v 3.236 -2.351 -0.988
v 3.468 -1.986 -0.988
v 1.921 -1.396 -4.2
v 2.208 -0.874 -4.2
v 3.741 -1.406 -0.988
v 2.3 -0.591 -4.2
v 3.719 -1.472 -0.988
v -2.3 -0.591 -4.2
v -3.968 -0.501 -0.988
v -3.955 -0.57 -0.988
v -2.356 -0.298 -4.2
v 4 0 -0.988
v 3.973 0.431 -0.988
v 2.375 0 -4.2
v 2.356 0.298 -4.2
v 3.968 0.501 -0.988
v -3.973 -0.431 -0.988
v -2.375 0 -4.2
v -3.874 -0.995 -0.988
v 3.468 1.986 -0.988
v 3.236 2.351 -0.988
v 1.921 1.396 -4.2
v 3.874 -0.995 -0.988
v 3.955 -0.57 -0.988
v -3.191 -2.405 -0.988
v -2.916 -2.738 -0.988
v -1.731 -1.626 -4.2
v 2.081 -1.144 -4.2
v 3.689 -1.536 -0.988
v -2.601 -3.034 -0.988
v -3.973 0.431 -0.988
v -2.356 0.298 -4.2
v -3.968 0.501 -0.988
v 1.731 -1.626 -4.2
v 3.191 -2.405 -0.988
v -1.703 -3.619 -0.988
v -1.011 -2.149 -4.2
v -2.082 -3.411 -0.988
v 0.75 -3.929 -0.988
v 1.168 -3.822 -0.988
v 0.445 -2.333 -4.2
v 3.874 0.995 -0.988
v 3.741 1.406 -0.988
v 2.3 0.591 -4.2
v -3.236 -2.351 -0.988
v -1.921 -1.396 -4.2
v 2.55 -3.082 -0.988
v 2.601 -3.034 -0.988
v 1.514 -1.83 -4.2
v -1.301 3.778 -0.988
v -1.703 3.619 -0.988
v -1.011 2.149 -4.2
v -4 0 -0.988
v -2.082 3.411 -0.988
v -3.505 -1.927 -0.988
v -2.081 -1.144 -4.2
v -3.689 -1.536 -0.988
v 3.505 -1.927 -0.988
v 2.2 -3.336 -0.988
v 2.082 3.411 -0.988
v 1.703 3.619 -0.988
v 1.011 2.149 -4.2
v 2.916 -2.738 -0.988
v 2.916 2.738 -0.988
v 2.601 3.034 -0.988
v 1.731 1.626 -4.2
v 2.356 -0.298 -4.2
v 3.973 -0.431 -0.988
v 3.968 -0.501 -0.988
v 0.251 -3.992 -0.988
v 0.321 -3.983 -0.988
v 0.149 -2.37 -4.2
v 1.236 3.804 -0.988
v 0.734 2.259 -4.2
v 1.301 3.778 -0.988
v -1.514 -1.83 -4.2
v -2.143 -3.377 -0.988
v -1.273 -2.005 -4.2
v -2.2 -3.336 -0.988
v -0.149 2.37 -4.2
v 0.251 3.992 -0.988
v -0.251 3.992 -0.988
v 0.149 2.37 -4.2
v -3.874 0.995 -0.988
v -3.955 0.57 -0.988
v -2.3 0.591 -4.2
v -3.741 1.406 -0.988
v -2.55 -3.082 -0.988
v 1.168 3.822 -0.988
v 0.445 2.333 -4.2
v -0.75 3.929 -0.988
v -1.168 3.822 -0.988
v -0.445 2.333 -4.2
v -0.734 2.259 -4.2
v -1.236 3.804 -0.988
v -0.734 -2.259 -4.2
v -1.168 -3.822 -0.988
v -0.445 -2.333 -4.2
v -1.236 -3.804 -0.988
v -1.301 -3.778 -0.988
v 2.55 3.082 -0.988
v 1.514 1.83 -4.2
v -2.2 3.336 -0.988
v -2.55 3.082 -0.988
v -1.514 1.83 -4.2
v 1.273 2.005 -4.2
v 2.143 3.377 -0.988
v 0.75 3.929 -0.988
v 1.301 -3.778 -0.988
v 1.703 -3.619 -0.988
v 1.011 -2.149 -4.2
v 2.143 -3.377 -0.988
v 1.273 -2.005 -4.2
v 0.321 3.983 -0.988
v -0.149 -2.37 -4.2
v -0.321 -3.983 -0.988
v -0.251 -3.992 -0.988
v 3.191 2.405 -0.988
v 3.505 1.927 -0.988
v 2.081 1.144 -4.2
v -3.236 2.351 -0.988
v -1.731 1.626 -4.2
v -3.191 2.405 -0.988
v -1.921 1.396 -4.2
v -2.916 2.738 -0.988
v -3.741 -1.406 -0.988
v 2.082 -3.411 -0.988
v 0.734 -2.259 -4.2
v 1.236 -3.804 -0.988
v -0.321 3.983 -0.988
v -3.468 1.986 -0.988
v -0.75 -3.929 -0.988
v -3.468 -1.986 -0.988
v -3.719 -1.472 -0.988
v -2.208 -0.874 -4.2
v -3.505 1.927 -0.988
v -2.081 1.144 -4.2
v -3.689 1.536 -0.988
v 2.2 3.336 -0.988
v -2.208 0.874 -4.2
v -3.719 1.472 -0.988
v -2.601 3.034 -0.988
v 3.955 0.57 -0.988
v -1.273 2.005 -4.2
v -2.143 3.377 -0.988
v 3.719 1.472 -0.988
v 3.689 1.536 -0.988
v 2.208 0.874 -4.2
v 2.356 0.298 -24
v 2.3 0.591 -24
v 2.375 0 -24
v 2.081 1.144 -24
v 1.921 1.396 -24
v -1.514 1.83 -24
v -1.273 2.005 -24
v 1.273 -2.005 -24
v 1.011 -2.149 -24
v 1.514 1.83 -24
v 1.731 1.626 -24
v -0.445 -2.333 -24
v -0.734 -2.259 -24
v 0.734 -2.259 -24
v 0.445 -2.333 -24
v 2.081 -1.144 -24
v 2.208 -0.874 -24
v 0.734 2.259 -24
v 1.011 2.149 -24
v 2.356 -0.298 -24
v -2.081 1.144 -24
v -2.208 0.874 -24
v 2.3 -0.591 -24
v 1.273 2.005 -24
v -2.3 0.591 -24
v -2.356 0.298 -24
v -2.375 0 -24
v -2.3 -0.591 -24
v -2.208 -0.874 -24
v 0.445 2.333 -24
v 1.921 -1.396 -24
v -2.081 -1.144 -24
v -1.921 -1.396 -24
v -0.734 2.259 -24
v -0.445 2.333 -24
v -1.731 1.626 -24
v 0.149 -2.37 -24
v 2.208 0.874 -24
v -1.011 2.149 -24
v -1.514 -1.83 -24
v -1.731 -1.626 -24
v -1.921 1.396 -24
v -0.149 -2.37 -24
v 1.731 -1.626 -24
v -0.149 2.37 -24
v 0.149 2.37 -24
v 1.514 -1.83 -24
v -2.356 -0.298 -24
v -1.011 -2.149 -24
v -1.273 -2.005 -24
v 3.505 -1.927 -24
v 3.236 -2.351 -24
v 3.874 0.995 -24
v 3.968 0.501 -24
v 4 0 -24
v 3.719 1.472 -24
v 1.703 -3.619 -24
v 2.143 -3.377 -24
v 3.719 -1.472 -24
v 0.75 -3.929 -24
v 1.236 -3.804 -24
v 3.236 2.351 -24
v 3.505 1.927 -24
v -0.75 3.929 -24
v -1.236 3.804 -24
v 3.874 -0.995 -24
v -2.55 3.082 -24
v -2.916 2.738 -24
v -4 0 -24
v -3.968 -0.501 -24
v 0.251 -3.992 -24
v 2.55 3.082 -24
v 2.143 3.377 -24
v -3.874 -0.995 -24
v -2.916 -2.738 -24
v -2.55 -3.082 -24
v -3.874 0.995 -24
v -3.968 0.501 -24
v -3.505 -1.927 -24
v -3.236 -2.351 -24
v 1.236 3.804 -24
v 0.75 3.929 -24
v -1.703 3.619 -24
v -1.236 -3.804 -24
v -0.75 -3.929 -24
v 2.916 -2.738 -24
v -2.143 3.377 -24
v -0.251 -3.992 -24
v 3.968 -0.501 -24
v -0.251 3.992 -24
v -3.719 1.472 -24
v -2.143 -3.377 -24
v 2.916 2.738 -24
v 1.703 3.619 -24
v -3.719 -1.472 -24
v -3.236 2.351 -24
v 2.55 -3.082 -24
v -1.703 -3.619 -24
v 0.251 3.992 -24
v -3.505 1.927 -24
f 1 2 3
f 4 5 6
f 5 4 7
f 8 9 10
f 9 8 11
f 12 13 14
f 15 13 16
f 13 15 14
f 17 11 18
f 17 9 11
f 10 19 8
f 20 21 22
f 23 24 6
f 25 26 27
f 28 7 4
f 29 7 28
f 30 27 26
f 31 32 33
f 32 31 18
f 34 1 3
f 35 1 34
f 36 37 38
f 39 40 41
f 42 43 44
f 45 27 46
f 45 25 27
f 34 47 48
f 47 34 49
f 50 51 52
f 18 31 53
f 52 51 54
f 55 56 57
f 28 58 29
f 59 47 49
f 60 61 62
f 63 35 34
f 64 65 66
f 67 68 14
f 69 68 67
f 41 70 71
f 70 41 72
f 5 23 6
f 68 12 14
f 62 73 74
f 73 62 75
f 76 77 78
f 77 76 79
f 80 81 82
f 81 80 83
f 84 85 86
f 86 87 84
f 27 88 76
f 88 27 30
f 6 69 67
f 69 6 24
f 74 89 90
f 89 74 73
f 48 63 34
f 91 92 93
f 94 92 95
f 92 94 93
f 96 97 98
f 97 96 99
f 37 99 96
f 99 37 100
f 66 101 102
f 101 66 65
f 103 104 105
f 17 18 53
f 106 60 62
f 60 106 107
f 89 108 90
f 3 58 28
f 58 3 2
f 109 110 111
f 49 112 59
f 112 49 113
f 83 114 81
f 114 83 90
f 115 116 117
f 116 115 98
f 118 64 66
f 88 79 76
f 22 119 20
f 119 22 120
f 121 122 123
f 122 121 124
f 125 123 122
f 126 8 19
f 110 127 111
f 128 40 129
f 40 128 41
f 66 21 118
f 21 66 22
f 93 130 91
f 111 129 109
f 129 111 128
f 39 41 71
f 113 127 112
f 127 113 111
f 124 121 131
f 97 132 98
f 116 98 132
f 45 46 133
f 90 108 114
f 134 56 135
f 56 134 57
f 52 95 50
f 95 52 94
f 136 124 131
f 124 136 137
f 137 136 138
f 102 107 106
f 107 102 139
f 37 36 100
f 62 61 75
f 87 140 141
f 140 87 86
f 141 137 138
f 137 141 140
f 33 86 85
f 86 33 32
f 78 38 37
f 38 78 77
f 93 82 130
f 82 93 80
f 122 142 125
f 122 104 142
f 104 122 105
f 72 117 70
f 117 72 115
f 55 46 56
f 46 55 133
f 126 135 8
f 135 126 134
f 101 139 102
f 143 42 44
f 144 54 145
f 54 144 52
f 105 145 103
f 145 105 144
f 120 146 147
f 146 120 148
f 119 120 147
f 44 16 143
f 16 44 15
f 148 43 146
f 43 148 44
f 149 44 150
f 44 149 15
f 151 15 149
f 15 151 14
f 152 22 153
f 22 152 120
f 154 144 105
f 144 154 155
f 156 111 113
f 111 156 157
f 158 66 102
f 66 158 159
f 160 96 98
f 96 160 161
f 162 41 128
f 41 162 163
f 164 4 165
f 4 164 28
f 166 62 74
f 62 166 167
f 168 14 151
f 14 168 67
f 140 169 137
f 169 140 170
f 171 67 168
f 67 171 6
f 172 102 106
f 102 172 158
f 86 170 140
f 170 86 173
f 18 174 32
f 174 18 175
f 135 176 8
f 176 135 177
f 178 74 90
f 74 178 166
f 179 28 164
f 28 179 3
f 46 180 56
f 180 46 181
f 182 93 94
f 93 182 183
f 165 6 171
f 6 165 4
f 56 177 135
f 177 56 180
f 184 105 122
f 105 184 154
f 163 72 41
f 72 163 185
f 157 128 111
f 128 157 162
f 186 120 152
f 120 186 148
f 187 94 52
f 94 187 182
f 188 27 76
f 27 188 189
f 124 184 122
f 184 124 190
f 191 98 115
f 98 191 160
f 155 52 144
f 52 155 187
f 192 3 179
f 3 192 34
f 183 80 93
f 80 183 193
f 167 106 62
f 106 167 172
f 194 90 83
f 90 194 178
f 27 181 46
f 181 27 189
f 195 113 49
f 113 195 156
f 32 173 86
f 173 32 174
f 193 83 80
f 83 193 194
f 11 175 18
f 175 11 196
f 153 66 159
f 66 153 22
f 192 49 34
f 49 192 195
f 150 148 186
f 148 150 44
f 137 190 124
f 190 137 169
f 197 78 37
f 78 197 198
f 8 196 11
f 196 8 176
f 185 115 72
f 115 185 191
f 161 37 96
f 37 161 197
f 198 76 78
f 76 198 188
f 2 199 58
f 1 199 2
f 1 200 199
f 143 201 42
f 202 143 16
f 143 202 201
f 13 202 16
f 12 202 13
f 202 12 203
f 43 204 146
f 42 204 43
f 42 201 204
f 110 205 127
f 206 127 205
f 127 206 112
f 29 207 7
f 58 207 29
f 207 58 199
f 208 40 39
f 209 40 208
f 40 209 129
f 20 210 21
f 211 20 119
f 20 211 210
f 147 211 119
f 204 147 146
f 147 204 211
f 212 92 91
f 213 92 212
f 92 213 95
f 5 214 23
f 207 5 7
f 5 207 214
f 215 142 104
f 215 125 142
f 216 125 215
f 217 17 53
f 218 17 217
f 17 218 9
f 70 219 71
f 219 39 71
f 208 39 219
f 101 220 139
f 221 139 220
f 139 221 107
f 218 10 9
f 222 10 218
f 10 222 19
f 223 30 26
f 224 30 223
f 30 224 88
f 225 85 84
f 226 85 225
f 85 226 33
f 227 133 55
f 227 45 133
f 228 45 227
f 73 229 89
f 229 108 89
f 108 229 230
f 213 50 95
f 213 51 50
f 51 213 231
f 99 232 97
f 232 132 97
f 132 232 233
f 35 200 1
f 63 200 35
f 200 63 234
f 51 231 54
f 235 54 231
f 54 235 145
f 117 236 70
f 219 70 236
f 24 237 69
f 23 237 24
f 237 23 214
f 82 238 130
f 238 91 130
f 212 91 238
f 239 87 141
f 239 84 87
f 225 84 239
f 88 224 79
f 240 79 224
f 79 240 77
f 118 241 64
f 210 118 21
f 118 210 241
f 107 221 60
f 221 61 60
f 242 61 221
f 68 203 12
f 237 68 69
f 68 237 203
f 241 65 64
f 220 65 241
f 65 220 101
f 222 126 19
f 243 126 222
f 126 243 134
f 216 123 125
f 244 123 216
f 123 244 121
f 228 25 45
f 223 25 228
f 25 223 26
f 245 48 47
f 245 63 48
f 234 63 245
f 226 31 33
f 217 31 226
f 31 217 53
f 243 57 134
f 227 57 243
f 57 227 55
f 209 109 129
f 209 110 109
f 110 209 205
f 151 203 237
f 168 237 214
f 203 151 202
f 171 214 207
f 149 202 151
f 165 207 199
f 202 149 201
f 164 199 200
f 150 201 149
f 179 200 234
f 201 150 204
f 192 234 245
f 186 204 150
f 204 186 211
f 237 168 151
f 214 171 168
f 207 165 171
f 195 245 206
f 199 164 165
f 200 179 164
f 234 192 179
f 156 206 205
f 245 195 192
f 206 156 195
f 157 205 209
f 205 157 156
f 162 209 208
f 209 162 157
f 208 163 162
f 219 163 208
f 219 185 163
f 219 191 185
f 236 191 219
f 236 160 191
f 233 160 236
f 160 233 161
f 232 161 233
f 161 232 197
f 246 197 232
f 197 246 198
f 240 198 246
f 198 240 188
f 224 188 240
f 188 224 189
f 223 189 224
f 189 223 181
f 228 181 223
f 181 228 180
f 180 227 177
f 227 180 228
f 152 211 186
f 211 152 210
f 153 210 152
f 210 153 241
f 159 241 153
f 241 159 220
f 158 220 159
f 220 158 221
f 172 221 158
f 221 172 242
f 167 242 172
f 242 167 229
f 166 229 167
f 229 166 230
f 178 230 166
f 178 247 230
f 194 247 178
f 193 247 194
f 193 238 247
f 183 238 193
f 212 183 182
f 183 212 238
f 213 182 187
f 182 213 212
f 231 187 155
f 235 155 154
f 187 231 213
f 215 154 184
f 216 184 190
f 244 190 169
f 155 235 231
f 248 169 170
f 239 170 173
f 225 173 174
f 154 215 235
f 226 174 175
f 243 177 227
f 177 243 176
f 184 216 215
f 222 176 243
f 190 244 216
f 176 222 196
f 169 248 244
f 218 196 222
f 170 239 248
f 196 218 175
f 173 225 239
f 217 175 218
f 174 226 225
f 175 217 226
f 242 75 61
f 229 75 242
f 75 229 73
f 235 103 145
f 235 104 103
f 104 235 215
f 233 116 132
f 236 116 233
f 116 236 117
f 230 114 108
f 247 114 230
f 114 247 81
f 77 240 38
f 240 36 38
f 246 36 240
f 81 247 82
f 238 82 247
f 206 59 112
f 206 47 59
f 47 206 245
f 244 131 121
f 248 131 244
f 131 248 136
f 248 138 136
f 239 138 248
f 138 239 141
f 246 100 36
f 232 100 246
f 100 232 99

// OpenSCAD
$fn = 50;

difference() {
	union() {
		translate(v = [0, 0, -24.0]) {
			cylinder(h = 27, r = 4.0);
		}
	}
	union() {
		translate(v = [0, 0, 0]) {
			rotate(a = [0, 0, 0]) {
				difference() {
					union() {
						translate(v = [0, 0, -27.0]) {
							cylinder(h = 27, r = 2.25);
						}
						translate(v = [0, 0, -4.2]) {
							cylinder(h = 4.2, r1 = 2.375, r2 = 4.5);
						}
						translate(v = [0, 0, -27.0]) {
							cylinder(h = 27, r = 2.375);
						}
						translate(v = [0, 0, -27.0]) {
							cylinder(h = 27, r = 2.25);
						}
					}
					union();
				}
			}
		}
		#cylinder(h = 3, r = 5.0);
	}
}
